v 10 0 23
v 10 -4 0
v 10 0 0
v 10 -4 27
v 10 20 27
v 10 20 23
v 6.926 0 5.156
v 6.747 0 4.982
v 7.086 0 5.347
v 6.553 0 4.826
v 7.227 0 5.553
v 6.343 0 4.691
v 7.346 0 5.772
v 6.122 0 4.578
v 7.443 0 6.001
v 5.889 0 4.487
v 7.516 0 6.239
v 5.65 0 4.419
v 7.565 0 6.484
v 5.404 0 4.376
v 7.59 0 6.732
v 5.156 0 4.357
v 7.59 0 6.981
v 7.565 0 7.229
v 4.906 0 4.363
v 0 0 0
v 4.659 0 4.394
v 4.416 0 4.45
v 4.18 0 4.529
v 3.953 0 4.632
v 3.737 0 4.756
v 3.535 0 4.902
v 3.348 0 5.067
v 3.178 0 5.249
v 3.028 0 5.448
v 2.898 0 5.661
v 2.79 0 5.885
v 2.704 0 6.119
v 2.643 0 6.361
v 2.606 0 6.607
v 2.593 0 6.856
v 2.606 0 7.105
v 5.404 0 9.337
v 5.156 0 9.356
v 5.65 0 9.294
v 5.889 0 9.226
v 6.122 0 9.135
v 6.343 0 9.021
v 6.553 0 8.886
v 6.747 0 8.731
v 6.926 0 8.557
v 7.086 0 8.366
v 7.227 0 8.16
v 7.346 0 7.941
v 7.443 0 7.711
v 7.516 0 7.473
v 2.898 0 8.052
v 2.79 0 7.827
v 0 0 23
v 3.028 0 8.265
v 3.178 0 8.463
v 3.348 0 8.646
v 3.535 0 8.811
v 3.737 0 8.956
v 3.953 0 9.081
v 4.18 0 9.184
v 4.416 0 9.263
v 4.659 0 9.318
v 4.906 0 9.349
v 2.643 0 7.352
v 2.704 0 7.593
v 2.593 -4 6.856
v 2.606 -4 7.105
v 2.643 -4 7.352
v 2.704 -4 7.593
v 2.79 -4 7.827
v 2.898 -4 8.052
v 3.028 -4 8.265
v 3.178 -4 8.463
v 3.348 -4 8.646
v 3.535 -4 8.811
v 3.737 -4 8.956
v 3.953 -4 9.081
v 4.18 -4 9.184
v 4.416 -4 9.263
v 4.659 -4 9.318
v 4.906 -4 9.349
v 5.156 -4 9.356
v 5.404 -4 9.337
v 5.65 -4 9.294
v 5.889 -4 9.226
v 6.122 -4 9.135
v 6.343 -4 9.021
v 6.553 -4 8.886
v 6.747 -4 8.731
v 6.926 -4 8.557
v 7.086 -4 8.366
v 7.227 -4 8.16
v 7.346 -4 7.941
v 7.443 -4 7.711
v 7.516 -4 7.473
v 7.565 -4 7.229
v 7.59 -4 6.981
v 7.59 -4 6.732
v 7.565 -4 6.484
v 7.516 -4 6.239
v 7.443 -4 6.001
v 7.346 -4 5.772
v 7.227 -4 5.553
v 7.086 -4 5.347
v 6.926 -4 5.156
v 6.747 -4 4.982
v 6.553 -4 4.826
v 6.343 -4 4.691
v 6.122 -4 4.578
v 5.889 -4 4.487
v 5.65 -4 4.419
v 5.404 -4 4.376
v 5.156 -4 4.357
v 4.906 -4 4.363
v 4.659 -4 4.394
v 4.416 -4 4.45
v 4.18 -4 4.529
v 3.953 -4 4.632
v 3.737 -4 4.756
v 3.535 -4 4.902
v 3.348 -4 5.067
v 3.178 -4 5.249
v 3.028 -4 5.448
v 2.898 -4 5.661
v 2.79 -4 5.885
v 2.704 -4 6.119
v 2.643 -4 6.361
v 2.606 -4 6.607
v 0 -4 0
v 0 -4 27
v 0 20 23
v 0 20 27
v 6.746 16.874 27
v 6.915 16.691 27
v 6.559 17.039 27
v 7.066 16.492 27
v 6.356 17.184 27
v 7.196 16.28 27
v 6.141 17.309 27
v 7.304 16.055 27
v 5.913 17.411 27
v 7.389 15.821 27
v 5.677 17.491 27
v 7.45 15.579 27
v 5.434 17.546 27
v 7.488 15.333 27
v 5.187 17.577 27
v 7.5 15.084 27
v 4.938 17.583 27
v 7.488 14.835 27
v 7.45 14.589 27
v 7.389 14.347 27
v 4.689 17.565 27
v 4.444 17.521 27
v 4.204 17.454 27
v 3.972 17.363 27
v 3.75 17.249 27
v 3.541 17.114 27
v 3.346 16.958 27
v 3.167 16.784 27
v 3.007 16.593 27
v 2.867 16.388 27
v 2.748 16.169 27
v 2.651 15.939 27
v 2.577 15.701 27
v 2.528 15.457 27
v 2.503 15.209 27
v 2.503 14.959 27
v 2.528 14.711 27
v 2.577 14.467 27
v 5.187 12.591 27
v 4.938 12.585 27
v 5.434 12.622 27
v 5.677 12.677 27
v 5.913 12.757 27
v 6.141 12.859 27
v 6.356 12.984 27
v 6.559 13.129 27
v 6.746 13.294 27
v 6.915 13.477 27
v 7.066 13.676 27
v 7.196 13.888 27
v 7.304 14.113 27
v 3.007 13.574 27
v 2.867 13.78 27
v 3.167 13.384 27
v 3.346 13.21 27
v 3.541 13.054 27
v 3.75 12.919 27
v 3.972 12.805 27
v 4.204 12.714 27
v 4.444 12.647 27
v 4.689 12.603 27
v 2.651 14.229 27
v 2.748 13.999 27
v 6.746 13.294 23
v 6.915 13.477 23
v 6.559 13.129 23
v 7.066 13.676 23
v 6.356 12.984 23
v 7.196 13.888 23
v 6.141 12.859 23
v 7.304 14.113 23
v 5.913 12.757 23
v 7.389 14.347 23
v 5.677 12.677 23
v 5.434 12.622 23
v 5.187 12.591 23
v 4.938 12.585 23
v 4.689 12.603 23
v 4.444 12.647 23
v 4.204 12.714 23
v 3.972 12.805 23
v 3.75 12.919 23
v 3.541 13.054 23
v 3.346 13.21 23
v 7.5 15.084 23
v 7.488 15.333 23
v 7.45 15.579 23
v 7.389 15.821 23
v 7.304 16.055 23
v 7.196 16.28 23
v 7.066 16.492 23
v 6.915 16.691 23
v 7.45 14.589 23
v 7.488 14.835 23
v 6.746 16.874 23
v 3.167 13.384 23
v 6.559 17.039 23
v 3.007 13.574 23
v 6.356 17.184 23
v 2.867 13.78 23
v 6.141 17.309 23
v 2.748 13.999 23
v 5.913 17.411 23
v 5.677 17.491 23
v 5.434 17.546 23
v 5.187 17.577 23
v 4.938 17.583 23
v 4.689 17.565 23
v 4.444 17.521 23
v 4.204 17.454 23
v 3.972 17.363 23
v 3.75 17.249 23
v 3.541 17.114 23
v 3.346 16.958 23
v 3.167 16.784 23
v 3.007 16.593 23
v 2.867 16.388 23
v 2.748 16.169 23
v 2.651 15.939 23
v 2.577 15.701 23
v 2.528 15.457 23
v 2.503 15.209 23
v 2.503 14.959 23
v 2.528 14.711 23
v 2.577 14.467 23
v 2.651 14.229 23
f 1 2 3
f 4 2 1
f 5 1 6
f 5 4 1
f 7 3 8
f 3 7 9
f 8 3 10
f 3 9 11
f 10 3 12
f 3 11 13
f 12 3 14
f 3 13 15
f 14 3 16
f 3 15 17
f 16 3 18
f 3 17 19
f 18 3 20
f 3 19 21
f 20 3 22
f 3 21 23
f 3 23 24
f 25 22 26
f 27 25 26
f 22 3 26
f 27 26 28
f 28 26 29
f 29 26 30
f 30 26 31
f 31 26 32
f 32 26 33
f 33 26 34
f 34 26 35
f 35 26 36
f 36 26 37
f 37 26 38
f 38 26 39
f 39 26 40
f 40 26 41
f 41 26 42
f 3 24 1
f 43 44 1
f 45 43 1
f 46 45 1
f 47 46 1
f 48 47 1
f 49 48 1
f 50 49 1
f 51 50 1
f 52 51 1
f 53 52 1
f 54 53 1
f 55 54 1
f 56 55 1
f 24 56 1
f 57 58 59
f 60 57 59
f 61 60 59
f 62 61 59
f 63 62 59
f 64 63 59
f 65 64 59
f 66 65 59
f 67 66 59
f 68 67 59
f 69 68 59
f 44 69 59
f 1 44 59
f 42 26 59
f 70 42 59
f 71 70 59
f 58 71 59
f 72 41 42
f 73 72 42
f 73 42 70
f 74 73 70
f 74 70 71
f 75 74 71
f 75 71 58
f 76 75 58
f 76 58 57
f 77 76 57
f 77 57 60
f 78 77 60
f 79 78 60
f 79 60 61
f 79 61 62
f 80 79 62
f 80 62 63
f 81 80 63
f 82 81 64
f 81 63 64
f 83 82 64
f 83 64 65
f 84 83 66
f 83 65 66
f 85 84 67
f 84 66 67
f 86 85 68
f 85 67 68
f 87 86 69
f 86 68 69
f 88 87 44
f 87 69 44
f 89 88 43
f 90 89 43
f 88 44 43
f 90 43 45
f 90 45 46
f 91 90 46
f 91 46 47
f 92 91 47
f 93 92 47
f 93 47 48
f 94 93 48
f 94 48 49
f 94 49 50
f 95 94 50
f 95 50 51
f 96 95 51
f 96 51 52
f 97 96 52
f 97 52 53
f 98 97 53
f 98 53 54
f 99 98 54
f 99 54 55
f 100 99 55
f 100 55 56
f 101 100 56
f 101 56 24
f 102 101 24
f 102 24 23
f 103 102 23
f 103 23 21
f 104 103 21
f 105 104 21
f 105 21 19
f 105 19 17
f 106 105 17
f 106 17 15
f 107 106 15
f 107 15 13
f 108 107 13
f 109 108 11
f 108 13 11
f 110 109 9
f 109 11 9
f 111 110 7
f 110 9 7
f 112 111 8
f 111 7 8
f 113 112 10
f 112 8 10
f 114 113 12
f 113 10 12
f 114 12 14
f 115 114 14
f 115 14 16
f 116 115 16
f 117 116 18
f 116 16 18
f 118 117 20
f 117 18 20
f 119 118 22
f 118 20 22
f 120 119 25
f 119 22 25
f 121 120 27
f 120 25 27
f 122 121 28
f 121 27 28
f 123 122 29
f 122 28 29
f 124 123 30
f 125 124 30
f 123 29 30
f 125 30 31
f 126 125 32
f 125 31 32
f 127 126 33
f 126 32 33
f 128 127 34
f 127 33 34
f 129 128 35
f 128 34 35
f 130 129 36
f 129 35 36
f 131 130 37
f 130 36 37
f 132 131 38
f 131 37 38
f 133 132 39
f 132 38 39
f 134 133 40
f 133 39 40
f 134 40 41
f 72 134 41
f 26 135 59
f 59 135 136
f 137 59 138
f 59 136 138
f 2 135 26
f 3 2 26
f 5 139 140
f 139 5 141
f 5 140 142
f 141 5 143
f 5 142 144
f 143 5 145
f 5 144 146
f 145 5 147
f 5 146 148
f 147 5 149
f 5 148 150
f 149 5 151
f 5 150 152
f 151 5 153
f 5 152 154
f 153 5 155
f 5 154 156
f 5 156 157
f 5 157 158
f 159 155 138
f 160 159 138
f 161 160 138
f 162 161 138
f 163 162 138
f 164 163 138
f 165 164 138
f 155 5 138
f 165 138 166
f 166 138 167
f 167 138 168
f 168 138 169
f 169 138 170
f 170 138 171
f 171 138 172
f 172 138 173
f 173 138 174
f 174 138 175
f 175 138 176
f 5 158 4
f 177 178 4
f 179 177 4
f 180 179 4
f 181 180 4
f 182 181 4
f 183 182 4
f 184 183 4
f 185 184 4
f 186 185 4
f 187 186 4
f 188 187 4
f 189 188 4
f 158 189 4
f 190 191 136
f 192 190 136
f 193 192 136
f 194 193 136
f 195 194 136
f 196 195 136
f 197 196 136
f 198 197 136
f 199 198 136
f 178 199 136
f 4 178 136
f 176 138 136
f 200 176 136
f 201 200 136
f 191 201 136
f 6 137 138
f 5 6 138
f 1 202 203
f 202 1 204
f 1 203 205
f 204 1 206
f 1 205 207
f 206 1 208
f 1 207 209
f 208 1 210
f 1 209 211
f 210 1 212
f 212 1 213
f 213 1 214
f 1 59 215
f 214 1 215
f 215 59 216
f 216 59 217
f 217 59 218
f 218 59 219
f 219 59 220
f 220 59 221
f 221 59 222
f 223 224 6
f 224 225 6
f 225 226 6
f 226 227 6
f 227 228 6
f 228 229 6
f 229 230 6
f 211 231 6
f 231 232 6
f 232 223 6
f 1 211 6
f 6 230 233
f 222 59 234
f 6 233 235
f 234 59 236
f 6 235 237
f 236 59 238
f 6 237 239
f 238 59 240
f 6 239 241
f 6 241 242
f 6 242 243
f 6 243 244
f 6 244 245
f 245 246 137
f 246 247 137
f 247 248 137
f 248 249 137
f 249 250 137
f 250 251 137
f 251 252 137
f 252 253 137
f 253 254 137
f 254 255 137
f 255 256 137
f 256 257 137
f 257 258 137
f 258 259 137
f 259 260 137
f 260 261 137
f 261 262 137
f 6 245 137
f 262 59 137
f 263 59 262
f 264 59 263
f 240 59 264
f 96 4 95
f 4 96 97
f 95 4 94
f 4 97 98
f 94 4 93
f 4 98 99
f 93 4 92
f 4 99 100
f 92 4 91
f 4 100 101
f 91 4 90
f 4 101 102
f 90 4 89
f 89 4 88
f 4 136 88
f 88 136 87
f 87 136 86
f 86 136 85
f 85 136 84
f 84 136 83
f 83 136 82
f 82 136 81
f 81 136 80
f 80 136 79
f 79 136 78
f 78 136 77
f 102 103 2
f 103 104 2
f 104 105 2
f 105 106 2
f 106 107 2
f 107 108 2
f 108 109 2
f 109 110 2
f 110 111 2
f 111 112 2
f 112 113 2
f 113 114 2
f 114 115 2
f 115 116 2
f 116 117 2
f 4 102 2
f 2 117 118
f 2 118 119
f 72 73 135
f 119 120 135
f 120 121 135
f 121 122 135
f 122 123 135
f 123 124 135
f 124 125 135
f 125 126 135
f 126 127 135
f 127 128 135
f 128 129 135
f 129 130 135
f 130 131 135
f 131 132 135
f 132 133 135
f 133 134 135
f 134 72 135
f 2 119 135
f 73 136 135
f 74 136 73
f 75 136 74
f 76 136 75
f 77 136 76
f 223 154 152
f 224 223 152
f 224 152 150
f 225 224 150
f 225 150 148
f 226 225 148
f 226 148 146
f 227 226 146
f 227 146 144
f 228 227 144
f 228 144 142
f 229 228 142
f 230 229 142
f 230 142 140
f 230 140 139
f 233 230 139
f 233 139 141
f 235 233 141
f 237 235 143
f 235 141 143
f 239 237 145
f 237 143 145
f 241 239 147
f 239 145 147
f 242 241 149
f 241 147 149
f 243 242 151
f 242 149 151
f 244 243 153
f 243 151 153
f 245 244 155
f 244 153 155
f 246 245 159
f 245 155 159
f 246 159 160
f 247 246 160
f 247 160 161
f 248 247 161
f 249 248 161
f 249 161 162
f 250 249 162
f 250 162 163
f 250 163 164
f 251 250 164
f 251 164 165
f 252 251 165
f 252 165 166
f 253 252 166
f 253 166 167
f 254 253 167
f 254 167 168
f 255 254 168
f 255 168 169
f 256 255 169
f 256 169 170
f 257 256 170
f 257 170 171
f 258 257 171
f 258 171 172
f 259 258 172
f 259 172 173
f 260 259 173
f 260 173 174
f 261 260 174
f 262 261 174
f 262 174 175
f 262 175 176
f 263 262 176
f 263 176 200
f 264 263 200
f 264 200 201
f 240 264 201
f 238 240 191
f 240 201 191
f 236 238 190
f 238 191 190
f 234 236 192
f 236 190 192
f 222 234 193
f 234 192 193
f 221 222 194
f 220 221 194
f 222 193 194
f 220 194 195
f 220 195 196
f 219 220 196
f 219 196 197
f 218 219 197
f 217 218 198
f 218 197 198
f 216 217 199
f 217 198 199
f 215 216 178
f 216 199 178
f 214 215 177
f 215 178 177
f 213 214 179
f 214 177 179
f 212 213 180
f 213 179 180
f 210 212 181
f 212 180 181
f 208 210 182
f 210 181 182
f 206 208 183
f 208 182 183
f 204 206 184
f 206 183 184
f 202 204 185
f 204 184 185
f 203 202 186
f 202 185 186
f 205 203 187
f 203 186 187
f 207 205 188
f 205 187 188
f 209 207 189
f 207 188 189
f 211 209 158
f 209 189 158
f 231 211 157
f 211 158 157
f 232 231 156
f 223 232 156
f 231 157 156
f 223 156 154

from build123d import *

# Parameters (mm, degrees)
F1_DEPTH = 10
F2_R     = 2.5
F3_DEPTH = 25
F4_R     = 2.5
F5_DEPTH = 36.2


with BuildPart() as f1:
    # F0 (on Right) → F1 (new body)
    with BuildSketch(Plane.YZ):
        Polygon((-4, 0), (0, 0), (0, 23), (20, 23), (20, 27), (-4, 27), align=None)
    extrude(amount=F1_DEPTH)

    # F2 (on face) → F3 (cut)
    with BuildSketch(Plane(origin=(0, 0, 0), x_dir=(-1, 0, 0), z_dir=(0, 1, 0))):
        with Locations((-5.093283, 6.856344)):
            Circle(F2_R)
    extrude(amount=-F3_DEPTH, mode=Mode.SUBTRACT)

    # F4 (on face) → F5 (cut)
    with BuildSketch(Plane.XY.offset(27)):
        with Locations((5, 15.083956)):
            Circle(F4_R)
    extrude(amount=-F5_DEPTH, mode=Mode.SUBTRACT)


solid = f1.part
